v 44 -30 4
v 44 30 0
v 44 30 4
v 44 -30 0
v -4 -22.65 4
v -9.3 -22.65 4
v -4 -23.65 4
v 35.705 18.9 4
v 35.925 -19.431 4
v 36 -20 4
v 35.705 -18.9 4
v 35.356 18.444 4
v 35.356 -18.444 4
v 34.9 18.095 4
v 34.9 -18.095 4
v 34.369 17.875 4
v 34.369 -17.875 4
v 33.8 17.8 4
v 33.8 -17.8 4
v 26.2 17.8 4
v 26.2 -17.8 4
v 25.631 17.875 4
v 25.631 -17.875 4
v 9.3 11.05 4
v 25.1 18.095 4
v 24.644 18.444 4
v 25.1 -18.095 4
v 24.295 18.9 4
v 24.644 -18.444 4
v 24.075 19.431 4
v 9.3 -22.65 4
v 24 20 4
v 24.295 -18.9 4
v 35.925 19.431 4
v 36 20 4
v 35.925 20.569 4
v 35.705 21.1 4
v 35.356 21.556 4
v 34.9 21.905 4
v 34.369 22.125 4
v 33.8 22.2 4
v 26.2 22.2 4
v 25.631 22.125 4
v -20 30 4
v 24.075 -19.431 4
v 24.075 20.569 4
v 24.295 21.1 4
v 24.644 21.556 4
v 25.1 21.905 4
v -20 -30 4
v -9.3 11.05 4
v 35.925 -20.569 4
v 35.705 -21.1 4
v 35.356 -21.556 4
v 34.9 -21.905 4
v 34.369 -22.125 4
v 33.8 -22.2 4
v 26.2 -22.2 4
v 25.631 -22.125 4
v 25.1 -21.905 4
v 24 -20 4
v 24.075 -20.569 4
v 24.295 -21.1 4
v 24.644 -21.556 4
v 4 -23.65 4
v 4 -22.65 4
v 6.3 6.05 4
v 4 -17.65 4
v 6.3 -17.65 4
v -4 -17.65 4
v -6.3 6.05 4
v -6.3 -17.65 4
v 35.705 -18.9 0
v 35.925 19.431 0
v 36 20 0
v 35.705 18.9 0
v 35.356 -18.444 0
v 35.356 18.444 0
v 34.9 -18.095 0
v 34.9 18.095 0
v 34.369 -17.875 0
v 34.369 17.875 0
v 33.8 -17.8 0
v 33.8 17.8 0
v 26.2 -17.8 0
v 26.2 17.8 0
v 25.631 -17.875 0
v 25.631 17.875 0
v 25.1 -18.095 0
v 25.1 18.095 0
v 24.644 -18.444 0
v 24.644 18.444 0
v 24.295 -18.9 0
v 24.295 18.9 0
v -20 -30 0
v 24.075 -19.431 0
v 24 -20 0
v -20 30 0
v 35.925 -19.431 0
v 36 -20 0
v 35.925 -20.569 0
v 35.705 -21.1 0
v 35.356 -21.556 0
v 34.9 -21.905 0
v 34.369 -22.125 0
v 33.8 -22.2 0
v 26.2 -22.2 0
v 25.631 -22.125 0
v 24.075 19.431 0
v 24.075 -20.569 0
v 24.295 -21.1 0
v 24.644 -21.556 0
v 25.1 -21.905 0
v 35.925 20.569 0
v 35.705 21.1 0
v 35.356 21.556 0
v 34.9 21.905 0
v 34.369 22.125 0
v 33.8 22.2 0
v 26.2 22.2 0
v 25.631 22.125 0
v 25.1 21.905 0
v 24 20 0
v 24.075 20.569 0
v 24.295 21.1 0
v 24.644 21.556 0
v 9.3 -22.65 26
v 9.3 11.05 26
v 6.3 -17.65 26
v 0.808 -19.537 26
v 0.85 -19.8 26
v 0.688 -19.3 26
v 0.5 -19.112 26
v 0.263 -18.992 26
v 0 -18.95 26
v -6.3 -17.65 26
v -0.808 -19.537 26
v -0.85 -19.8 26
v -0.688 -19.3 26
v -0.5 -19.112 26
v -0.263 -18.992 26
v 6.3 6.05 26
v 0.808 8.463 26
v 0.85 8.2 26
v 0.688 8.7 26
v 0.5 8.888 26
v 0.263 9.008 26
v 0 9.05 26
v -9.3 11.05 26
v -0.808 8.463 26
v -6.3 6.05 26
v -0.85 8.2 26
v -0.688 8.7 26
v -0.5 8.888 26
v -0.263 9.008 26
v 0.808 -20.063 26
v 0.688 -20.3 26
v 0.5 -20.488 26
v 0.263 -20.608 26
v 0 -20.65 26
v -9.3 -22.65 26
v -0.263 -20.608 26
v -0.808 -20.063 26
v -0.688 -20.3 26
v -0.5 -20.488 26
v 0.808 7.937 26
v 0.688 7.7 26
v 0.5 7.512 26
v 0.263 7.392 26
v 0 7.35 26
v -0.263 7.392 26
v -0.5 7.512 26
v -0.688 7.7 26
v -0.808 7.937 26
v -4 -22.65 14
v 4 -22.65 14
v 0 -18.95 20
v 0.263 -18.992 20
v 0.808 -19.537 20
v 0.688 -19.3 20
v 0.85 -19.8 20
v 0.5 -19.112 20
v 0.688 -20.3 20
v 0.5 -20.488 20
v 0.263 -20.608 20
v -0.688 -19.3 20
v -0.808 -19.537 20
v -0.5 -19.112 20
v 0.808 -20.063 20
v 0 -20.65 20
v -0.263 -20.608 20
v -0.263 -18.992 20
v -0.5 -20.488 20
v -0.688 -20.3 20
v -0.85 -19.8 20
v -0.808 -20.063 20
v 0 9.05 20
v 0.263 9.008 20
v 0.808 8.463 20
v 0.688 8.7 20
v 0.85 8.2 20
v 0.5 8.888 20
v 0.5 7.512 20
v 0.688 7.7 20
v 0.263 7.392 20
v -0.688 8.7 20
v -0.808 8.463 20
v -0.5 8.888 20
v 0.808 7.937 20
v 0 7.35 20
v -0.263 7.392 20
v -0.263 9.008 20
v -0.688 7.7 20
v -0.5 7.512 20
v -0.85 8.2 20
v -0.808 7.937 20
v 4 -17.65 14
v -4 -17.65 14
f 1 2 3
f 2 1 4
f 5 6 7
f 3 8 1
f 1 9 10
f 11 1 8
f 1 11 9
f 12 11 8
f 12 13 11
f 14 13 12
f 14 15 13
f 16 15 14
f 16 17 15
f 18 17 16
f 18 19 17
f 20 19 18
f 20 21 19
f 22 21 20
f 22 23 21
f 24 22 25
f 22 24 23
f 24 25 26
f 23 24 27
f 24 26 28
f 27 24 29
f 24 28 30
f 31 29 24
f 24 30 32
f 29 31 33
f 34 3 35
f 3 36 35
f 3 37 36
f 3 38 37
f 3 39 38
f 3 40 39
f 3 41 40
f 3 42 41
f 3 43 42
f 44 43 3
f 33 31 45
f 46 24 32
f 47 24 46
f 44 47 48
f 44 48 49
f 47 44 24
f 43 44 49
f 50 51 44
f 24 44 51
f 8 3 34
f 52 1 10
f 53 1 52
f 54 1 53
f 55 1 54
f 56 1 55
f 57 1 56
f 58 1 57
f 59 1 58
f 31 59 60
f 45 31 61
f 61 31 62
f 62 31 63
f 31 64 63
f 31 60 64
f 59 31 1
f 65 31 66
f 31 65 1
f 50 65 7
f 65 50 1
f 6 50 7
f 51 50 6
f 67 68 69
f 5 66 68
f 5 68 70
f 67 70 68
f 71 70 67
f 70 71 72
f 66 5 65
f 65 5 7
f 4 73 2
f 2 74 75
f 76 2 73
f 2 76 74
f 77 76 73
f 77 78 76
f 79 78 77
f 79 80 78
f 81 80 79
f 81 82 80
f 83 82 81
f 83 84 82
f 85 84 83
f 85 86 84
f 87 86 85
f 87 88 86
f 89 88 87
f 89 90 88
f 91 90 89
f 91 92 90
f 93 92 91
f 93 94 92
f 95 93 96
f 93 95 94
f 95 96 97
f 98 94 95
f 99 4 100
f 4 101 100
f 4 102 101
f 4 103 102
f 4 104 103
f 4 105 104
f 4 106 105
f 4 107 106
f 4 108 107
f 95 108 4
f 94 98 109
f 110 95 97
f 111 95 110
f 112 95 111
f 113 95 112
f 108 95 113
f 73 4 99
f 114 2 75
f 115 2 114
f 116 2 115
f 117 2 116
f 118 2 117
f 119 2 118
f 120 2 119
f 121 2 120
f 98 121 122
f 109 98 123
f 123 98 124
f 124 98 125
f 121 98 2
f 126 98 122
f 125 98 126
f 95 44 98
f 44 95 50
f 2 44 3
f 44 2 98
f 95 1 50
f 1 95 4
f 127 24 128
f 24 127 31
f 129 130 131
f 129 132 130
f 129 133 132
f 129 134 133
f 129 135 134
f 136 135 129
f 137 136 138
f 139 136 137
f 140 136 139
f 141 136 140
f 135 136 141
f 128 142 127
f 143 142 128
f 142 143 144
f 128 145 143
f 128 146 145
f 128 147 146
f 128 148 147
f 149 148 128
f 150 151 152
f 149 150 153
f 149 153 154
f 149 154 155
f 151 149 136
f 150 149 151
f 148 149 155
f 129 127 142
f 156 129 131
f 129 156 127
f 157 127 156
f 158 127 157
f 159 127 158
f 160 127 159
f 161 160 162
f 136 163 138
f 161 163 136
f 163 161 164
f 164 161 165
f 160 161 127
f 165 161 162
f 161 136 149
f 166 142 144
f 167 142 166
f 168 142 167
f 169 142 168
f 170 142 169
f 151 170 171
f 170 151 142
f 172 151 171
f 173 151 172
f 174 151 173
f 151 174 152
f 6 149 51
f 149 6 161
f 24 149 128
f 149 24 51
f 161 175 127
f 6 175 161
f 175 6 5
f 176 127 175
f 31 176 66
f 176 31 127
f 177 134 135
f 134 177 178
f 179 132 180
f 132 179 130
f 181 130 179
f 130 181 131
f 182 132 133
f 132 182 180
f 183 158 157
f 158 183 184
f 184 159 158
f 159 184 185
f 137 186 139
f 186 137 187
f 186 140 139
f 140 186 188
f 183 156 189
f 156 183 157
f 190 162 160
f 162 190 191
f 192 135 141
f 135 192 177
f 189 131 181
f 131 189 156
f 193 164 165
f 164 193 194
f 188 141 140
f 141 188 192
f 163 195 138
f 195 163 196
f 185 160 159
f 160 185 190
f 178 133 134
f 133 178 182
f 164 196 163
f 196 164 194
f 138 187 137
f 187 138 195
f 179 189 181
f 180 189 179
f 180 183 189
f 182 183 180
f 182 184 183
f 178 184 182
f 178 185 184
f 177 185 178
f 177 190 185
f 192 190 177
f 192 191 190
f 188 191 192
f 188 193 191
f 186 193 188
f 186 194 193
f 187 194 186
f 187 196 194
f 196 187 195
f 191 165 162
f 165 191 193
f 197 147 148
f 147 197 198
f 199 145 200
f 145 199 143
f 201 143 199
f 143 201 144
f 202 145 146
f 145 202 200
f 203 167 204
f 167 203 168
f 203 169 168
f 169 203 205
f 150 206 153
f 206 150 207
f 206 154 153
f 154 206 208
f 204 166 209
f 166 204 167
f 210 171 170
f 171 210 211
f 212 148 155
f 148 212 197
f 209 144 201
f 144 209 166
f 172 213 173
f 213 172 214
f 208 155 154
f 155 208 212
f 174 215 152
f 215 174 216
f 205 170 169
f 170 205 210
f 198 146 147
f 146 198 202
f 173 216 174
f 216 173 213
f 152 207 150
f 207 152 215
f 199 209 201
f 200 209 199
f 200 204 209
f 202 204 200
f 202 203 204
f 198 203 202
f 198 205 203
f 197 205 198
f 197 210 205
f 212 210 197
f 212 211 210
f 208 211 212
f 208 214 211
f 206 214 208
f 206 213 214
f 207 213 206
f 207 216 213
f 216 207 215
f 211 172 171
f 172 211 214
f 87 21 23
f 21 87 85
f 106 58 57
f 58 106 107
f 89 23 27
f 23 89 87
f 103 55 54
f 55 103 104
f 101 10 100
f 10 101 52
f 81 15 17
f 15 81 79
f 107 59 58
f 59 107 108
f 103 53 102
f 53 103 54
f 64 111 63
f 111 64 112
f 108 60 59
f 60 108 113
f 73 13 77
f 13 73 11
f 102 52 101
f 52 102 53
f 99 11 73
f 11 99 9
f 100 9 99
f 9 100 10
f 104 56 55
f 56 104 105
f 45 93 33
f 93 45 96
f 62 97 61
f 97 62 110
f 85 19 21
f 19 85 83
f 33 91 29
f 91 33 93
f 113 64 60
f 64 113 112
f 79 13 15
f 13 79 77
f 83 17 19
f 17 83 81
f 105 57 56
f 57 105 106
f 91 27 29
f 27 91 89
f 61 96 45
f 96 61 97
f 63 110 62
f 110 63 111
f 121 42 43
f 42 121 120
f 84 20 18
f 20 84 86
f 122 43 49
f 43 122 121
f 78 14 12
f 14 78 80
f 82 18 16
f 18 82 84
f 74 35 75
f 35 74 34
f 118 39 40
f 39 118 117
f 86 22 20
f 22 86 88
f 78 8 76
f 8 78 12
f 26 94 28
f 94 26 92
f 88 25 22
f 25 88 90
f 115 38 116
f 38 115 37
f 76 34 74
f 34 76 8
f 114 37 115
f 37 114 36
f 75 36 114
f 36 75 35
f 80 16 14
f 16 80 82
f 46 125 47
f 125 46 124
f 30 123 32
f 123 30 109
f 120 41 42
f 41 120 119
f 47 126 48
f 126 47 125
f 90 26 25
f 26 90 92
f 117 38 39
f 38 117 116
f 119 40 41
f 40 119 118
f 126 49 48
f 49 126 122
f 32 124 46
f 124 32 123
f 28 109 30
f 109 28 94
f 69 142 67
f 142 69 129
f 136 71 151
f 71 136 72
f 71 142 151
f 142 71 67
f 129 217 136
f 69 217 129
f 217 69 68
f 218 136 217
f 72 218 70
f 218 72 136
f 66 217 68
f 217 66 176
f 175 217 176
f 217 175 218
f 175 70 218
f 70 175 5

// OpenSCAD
// servo_bracket.scad
//
// bracket that holds the SCS0009 offset parallel to the needle valve stem so
// the gear pair in servo_valve_coupling.scad meshes. the servo drops into a
// pocket in a tower, hangs from its mounting tabs, and gets two self tap
// screws down into the tower top. the base has slotted holes so I can slide
// the whole bracket toward or away from the valve to set gear mesh, then
// lock it down to the baseplate tile grid.
//
// print as rendered, base flat on the bed, no supports needed.
// PETG, 0.2 mm layers, 4 walls, 30% infill.

// ---------------- gear geometry, must match servo_valve_coupling.scad ------
// center distance = (16T + 32T) * module 1.5 / 2 = 36 mm. the slots give me
// about +/- 4 mm of adjustment around wherever I put the bracket, so I place
// the servo axis 36 mm from the valve stem and fine tune by sliding.
center_dist = 36;
echo(str("set servo axis ", center_dist, " mm from the valve stem axis"));

// ---------------- servo dimensions ----------------
sv_w         = 12.1;  // case width (datasheet says 12.1)
sv_l         = 23.2;  // case length (datasheet says 23.2)
sv_h         = 25.25; // case height, tabs near the top
pocket_clr   = 0.5;   // total clearance added to the pocket
tab_spacing  = 28;    // VERIFY WITH CALIPERS: mounting tab hole spacing
tab_screw_d  = 1.7;   // pilot for the servo's own self tap screws
shaft_offset = 5.8;   // VERIFY WITH CALIPERS: output shaft offset from case
                      // center along the long axis (shaft sits toward one end)
hang_depth   = 20;    // VERIFY WITH CALIPERS: tab underside to case bottom

// ---------------- bracket geometry ----------------
base_t     = 4;              // base plate thickness
tower_h    = 22;             // servo tab face height above the base top.
                             // this sets the pinion height, check it against
                             // where the valve gear ends up on the stem before
                             // printing. must be > hang_depth so the case
                             // floats instead of bottoming out.
side_wall  = 3;              // walls beside the servo body
end_wall   = 5;              // walls at the ends, thicker so the tab screws
                             // have meat to bite into
slot_w     = 4.4;            // M4 clearance slot width
slot_len   = 12;             // slot length, about +/- 4 mm of mesh adjust
slot_x     = 30;             // slot center distance from the servo axis,
                             // pointing away from the valve
slot_y     = 20;             // slots at +/- 20 mm, so 40 mm apart, lands on
                             // the 20 mm tile grid
cable_w    = 8;              // cable exit window width
cable_h    = 10;             // cable exit window height

// derived
pocket_w = sv_w + pocket_clr;
pocket_l = sv_l + pocket_clr;

// ---------------- modules ----------------

// slotted M4 hole, long axis along X so the bracket slides in the mesh direction
module adjust_slot() {
    hull() {
        translate([slot_x - (slot_len - slot_w) / 2, 0, -0.5])
            cylinder(d = slot_w, h = base_t + 1, $fn = 24);
        translate([slot_x + (slot_len - slot_w) / 2, 0, -0.5])
            cylinder(d = slot_w, h = base_t + 1, $fn = 24);
    }
}

// the whole bracket. servo output shaft axis is the Z axis through the origin,
// so "distance to the valve stem" is measured straight from x=0, y=0.
// the case center sits at y = -shaft_offset because the shaft is not centered
// in the case.
module servo_bracket() {
    difference() {
        union() {
            // base plate, reaches out under the slots
            translate([-20, -30, 0])
                cube([64, 60, base_t]);
            // tower
            translate([-(pocket_w / 2 + side_wall),
                       -shaft_offset - pocket_l / 2 - end_wall, 0])
                cube([pocket_w + 2 * side_wall,
                      pocket_l + 2 * end_wall,
                      base_t + tower_h]);
        }
        // servo pocket, open at the top, stops at the base so nothing pokes
        // through. servo hangs from its tabs and the case bottom floats.
        translate([-pocket_w / 2, -shaft_offset - pocket_l / 2, base_t])
            cube([pocket_w, pocket_l, tower_h + 1]);
        // pilot holes for the two tab screws, straight down into the end walls
        for (yy = [-shaft_offset - tab_spacing / 2,
                   -shaft_offset + tab_spacing / 2])
            translate([0, yy, base_t + tower_h - 6])
                cylinder(d = tab_screw_d, h = 7, $fn = 20);
        // cable exit window through the far end wall, down at the bottom
        translate([-cable_w / 2, -shaft_offset - pocket_l / 2 - end_wall - 1, base_t])
            cube([cable_w, end_wall + 2, cable_h]);
        // slotted mounting holes, M4 into the tile bosses
        for (yy = [-slot_y, slot_y])
            translate([0, yy, 0]) adjust_slot();
    }
}

// ---------------- render, print orientation ----------------
servo_bracket();
